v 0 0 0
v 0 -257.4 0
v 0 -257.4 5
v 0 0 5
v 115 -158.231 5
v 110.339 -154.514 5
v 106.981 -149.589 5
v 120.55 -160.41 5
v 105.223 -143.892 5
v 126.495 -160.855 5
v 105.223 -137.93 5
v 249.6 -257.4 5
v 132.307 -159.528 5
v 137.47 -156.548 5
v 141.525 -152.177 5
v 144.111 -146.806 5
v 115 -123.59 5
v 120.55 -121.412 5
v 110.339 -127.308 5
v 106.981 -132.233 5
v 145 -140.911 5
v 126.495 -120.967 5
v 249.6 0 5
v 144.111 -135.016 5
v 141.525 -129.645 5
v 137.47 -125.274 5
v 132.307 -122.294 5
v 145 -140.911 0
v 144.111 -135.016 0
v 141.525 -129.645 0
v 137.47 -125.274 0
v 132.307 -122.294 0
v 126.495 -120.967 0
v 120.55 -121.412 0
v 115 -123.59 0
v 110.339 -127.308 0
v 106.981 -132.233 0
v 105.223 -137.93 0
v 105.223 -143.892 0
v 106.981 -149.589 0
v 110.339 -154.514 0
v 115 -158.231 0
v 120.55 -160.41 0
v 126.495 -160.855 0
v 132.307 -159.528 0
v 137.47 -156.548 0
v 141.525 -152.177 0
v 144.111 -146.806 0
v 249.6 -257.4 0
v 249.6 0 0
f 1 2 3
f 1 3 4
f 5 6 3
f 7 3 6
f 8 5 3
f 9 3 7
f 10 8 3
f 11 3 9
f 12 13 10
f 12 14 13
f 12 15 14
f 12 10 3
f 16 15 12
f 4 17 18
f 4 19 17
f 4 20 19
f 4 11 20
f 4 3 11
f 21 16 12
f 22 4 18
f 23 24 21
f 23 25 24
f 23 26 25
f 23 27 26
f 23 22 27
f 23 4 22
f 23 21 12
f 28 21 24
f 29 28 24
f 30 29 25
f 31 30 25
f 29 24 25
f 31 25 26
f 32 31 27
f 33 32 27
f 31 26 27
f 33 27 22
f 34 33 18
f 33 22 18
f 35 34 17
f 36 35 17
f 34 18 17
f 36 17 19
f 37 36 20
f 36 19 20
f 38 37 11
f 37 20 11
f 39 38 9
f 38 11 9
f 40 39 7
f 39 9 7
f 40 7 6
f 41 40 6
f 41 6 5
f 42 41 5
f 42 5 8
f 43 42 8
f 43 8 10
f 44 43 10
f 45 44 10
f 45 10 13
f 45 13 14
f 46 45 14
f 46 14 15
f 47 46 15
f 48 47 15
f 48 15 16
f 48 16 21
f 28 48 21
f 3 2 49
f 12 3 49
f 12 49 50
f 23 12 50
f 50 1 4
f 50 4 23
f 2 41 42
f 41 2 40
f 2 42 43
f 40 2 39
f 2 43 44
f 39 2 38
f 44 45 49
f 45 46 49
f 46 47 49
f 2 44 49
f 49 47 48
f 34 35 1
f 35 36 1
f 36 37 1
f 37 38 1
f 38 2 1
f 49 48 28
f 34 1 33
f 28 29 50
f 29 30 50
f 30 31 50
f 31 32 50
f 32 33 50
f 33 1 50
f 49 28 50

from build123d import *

# Parameters (mm, degrees)
SKETCH1_W           = 249.6
SKETCH1_H           = 257.4
BOSS_EXTRUDE1_DEPTH = 5
SKETCH2_R           = 20
CUT_EXTRUDE1_DEPTH  = 6


with BuildPart() as part:
    # Sketch1 → Boss-Extrude1 (new body)
    with BuildSketch(Plane.XY):
        with Locations((124.8, -128.7)):
            Rectangle(SKETCH1_W, SKETCH1_H)
    extrude(amount=BOSS_EXTRUDE1_DEPTH)

    # Sketch2 → Cut-Extrude1 (cut, through all)
    with BuildSketch(Plane.XY.offset(5)):
        with Locations((125, -140.910978413)):
            Circle(SKETCH2_R)
    extrude(amount=-CUT_EXTRUDE1_DEPTH, mode=Mode.SUBTRACT)


solid = part.part
